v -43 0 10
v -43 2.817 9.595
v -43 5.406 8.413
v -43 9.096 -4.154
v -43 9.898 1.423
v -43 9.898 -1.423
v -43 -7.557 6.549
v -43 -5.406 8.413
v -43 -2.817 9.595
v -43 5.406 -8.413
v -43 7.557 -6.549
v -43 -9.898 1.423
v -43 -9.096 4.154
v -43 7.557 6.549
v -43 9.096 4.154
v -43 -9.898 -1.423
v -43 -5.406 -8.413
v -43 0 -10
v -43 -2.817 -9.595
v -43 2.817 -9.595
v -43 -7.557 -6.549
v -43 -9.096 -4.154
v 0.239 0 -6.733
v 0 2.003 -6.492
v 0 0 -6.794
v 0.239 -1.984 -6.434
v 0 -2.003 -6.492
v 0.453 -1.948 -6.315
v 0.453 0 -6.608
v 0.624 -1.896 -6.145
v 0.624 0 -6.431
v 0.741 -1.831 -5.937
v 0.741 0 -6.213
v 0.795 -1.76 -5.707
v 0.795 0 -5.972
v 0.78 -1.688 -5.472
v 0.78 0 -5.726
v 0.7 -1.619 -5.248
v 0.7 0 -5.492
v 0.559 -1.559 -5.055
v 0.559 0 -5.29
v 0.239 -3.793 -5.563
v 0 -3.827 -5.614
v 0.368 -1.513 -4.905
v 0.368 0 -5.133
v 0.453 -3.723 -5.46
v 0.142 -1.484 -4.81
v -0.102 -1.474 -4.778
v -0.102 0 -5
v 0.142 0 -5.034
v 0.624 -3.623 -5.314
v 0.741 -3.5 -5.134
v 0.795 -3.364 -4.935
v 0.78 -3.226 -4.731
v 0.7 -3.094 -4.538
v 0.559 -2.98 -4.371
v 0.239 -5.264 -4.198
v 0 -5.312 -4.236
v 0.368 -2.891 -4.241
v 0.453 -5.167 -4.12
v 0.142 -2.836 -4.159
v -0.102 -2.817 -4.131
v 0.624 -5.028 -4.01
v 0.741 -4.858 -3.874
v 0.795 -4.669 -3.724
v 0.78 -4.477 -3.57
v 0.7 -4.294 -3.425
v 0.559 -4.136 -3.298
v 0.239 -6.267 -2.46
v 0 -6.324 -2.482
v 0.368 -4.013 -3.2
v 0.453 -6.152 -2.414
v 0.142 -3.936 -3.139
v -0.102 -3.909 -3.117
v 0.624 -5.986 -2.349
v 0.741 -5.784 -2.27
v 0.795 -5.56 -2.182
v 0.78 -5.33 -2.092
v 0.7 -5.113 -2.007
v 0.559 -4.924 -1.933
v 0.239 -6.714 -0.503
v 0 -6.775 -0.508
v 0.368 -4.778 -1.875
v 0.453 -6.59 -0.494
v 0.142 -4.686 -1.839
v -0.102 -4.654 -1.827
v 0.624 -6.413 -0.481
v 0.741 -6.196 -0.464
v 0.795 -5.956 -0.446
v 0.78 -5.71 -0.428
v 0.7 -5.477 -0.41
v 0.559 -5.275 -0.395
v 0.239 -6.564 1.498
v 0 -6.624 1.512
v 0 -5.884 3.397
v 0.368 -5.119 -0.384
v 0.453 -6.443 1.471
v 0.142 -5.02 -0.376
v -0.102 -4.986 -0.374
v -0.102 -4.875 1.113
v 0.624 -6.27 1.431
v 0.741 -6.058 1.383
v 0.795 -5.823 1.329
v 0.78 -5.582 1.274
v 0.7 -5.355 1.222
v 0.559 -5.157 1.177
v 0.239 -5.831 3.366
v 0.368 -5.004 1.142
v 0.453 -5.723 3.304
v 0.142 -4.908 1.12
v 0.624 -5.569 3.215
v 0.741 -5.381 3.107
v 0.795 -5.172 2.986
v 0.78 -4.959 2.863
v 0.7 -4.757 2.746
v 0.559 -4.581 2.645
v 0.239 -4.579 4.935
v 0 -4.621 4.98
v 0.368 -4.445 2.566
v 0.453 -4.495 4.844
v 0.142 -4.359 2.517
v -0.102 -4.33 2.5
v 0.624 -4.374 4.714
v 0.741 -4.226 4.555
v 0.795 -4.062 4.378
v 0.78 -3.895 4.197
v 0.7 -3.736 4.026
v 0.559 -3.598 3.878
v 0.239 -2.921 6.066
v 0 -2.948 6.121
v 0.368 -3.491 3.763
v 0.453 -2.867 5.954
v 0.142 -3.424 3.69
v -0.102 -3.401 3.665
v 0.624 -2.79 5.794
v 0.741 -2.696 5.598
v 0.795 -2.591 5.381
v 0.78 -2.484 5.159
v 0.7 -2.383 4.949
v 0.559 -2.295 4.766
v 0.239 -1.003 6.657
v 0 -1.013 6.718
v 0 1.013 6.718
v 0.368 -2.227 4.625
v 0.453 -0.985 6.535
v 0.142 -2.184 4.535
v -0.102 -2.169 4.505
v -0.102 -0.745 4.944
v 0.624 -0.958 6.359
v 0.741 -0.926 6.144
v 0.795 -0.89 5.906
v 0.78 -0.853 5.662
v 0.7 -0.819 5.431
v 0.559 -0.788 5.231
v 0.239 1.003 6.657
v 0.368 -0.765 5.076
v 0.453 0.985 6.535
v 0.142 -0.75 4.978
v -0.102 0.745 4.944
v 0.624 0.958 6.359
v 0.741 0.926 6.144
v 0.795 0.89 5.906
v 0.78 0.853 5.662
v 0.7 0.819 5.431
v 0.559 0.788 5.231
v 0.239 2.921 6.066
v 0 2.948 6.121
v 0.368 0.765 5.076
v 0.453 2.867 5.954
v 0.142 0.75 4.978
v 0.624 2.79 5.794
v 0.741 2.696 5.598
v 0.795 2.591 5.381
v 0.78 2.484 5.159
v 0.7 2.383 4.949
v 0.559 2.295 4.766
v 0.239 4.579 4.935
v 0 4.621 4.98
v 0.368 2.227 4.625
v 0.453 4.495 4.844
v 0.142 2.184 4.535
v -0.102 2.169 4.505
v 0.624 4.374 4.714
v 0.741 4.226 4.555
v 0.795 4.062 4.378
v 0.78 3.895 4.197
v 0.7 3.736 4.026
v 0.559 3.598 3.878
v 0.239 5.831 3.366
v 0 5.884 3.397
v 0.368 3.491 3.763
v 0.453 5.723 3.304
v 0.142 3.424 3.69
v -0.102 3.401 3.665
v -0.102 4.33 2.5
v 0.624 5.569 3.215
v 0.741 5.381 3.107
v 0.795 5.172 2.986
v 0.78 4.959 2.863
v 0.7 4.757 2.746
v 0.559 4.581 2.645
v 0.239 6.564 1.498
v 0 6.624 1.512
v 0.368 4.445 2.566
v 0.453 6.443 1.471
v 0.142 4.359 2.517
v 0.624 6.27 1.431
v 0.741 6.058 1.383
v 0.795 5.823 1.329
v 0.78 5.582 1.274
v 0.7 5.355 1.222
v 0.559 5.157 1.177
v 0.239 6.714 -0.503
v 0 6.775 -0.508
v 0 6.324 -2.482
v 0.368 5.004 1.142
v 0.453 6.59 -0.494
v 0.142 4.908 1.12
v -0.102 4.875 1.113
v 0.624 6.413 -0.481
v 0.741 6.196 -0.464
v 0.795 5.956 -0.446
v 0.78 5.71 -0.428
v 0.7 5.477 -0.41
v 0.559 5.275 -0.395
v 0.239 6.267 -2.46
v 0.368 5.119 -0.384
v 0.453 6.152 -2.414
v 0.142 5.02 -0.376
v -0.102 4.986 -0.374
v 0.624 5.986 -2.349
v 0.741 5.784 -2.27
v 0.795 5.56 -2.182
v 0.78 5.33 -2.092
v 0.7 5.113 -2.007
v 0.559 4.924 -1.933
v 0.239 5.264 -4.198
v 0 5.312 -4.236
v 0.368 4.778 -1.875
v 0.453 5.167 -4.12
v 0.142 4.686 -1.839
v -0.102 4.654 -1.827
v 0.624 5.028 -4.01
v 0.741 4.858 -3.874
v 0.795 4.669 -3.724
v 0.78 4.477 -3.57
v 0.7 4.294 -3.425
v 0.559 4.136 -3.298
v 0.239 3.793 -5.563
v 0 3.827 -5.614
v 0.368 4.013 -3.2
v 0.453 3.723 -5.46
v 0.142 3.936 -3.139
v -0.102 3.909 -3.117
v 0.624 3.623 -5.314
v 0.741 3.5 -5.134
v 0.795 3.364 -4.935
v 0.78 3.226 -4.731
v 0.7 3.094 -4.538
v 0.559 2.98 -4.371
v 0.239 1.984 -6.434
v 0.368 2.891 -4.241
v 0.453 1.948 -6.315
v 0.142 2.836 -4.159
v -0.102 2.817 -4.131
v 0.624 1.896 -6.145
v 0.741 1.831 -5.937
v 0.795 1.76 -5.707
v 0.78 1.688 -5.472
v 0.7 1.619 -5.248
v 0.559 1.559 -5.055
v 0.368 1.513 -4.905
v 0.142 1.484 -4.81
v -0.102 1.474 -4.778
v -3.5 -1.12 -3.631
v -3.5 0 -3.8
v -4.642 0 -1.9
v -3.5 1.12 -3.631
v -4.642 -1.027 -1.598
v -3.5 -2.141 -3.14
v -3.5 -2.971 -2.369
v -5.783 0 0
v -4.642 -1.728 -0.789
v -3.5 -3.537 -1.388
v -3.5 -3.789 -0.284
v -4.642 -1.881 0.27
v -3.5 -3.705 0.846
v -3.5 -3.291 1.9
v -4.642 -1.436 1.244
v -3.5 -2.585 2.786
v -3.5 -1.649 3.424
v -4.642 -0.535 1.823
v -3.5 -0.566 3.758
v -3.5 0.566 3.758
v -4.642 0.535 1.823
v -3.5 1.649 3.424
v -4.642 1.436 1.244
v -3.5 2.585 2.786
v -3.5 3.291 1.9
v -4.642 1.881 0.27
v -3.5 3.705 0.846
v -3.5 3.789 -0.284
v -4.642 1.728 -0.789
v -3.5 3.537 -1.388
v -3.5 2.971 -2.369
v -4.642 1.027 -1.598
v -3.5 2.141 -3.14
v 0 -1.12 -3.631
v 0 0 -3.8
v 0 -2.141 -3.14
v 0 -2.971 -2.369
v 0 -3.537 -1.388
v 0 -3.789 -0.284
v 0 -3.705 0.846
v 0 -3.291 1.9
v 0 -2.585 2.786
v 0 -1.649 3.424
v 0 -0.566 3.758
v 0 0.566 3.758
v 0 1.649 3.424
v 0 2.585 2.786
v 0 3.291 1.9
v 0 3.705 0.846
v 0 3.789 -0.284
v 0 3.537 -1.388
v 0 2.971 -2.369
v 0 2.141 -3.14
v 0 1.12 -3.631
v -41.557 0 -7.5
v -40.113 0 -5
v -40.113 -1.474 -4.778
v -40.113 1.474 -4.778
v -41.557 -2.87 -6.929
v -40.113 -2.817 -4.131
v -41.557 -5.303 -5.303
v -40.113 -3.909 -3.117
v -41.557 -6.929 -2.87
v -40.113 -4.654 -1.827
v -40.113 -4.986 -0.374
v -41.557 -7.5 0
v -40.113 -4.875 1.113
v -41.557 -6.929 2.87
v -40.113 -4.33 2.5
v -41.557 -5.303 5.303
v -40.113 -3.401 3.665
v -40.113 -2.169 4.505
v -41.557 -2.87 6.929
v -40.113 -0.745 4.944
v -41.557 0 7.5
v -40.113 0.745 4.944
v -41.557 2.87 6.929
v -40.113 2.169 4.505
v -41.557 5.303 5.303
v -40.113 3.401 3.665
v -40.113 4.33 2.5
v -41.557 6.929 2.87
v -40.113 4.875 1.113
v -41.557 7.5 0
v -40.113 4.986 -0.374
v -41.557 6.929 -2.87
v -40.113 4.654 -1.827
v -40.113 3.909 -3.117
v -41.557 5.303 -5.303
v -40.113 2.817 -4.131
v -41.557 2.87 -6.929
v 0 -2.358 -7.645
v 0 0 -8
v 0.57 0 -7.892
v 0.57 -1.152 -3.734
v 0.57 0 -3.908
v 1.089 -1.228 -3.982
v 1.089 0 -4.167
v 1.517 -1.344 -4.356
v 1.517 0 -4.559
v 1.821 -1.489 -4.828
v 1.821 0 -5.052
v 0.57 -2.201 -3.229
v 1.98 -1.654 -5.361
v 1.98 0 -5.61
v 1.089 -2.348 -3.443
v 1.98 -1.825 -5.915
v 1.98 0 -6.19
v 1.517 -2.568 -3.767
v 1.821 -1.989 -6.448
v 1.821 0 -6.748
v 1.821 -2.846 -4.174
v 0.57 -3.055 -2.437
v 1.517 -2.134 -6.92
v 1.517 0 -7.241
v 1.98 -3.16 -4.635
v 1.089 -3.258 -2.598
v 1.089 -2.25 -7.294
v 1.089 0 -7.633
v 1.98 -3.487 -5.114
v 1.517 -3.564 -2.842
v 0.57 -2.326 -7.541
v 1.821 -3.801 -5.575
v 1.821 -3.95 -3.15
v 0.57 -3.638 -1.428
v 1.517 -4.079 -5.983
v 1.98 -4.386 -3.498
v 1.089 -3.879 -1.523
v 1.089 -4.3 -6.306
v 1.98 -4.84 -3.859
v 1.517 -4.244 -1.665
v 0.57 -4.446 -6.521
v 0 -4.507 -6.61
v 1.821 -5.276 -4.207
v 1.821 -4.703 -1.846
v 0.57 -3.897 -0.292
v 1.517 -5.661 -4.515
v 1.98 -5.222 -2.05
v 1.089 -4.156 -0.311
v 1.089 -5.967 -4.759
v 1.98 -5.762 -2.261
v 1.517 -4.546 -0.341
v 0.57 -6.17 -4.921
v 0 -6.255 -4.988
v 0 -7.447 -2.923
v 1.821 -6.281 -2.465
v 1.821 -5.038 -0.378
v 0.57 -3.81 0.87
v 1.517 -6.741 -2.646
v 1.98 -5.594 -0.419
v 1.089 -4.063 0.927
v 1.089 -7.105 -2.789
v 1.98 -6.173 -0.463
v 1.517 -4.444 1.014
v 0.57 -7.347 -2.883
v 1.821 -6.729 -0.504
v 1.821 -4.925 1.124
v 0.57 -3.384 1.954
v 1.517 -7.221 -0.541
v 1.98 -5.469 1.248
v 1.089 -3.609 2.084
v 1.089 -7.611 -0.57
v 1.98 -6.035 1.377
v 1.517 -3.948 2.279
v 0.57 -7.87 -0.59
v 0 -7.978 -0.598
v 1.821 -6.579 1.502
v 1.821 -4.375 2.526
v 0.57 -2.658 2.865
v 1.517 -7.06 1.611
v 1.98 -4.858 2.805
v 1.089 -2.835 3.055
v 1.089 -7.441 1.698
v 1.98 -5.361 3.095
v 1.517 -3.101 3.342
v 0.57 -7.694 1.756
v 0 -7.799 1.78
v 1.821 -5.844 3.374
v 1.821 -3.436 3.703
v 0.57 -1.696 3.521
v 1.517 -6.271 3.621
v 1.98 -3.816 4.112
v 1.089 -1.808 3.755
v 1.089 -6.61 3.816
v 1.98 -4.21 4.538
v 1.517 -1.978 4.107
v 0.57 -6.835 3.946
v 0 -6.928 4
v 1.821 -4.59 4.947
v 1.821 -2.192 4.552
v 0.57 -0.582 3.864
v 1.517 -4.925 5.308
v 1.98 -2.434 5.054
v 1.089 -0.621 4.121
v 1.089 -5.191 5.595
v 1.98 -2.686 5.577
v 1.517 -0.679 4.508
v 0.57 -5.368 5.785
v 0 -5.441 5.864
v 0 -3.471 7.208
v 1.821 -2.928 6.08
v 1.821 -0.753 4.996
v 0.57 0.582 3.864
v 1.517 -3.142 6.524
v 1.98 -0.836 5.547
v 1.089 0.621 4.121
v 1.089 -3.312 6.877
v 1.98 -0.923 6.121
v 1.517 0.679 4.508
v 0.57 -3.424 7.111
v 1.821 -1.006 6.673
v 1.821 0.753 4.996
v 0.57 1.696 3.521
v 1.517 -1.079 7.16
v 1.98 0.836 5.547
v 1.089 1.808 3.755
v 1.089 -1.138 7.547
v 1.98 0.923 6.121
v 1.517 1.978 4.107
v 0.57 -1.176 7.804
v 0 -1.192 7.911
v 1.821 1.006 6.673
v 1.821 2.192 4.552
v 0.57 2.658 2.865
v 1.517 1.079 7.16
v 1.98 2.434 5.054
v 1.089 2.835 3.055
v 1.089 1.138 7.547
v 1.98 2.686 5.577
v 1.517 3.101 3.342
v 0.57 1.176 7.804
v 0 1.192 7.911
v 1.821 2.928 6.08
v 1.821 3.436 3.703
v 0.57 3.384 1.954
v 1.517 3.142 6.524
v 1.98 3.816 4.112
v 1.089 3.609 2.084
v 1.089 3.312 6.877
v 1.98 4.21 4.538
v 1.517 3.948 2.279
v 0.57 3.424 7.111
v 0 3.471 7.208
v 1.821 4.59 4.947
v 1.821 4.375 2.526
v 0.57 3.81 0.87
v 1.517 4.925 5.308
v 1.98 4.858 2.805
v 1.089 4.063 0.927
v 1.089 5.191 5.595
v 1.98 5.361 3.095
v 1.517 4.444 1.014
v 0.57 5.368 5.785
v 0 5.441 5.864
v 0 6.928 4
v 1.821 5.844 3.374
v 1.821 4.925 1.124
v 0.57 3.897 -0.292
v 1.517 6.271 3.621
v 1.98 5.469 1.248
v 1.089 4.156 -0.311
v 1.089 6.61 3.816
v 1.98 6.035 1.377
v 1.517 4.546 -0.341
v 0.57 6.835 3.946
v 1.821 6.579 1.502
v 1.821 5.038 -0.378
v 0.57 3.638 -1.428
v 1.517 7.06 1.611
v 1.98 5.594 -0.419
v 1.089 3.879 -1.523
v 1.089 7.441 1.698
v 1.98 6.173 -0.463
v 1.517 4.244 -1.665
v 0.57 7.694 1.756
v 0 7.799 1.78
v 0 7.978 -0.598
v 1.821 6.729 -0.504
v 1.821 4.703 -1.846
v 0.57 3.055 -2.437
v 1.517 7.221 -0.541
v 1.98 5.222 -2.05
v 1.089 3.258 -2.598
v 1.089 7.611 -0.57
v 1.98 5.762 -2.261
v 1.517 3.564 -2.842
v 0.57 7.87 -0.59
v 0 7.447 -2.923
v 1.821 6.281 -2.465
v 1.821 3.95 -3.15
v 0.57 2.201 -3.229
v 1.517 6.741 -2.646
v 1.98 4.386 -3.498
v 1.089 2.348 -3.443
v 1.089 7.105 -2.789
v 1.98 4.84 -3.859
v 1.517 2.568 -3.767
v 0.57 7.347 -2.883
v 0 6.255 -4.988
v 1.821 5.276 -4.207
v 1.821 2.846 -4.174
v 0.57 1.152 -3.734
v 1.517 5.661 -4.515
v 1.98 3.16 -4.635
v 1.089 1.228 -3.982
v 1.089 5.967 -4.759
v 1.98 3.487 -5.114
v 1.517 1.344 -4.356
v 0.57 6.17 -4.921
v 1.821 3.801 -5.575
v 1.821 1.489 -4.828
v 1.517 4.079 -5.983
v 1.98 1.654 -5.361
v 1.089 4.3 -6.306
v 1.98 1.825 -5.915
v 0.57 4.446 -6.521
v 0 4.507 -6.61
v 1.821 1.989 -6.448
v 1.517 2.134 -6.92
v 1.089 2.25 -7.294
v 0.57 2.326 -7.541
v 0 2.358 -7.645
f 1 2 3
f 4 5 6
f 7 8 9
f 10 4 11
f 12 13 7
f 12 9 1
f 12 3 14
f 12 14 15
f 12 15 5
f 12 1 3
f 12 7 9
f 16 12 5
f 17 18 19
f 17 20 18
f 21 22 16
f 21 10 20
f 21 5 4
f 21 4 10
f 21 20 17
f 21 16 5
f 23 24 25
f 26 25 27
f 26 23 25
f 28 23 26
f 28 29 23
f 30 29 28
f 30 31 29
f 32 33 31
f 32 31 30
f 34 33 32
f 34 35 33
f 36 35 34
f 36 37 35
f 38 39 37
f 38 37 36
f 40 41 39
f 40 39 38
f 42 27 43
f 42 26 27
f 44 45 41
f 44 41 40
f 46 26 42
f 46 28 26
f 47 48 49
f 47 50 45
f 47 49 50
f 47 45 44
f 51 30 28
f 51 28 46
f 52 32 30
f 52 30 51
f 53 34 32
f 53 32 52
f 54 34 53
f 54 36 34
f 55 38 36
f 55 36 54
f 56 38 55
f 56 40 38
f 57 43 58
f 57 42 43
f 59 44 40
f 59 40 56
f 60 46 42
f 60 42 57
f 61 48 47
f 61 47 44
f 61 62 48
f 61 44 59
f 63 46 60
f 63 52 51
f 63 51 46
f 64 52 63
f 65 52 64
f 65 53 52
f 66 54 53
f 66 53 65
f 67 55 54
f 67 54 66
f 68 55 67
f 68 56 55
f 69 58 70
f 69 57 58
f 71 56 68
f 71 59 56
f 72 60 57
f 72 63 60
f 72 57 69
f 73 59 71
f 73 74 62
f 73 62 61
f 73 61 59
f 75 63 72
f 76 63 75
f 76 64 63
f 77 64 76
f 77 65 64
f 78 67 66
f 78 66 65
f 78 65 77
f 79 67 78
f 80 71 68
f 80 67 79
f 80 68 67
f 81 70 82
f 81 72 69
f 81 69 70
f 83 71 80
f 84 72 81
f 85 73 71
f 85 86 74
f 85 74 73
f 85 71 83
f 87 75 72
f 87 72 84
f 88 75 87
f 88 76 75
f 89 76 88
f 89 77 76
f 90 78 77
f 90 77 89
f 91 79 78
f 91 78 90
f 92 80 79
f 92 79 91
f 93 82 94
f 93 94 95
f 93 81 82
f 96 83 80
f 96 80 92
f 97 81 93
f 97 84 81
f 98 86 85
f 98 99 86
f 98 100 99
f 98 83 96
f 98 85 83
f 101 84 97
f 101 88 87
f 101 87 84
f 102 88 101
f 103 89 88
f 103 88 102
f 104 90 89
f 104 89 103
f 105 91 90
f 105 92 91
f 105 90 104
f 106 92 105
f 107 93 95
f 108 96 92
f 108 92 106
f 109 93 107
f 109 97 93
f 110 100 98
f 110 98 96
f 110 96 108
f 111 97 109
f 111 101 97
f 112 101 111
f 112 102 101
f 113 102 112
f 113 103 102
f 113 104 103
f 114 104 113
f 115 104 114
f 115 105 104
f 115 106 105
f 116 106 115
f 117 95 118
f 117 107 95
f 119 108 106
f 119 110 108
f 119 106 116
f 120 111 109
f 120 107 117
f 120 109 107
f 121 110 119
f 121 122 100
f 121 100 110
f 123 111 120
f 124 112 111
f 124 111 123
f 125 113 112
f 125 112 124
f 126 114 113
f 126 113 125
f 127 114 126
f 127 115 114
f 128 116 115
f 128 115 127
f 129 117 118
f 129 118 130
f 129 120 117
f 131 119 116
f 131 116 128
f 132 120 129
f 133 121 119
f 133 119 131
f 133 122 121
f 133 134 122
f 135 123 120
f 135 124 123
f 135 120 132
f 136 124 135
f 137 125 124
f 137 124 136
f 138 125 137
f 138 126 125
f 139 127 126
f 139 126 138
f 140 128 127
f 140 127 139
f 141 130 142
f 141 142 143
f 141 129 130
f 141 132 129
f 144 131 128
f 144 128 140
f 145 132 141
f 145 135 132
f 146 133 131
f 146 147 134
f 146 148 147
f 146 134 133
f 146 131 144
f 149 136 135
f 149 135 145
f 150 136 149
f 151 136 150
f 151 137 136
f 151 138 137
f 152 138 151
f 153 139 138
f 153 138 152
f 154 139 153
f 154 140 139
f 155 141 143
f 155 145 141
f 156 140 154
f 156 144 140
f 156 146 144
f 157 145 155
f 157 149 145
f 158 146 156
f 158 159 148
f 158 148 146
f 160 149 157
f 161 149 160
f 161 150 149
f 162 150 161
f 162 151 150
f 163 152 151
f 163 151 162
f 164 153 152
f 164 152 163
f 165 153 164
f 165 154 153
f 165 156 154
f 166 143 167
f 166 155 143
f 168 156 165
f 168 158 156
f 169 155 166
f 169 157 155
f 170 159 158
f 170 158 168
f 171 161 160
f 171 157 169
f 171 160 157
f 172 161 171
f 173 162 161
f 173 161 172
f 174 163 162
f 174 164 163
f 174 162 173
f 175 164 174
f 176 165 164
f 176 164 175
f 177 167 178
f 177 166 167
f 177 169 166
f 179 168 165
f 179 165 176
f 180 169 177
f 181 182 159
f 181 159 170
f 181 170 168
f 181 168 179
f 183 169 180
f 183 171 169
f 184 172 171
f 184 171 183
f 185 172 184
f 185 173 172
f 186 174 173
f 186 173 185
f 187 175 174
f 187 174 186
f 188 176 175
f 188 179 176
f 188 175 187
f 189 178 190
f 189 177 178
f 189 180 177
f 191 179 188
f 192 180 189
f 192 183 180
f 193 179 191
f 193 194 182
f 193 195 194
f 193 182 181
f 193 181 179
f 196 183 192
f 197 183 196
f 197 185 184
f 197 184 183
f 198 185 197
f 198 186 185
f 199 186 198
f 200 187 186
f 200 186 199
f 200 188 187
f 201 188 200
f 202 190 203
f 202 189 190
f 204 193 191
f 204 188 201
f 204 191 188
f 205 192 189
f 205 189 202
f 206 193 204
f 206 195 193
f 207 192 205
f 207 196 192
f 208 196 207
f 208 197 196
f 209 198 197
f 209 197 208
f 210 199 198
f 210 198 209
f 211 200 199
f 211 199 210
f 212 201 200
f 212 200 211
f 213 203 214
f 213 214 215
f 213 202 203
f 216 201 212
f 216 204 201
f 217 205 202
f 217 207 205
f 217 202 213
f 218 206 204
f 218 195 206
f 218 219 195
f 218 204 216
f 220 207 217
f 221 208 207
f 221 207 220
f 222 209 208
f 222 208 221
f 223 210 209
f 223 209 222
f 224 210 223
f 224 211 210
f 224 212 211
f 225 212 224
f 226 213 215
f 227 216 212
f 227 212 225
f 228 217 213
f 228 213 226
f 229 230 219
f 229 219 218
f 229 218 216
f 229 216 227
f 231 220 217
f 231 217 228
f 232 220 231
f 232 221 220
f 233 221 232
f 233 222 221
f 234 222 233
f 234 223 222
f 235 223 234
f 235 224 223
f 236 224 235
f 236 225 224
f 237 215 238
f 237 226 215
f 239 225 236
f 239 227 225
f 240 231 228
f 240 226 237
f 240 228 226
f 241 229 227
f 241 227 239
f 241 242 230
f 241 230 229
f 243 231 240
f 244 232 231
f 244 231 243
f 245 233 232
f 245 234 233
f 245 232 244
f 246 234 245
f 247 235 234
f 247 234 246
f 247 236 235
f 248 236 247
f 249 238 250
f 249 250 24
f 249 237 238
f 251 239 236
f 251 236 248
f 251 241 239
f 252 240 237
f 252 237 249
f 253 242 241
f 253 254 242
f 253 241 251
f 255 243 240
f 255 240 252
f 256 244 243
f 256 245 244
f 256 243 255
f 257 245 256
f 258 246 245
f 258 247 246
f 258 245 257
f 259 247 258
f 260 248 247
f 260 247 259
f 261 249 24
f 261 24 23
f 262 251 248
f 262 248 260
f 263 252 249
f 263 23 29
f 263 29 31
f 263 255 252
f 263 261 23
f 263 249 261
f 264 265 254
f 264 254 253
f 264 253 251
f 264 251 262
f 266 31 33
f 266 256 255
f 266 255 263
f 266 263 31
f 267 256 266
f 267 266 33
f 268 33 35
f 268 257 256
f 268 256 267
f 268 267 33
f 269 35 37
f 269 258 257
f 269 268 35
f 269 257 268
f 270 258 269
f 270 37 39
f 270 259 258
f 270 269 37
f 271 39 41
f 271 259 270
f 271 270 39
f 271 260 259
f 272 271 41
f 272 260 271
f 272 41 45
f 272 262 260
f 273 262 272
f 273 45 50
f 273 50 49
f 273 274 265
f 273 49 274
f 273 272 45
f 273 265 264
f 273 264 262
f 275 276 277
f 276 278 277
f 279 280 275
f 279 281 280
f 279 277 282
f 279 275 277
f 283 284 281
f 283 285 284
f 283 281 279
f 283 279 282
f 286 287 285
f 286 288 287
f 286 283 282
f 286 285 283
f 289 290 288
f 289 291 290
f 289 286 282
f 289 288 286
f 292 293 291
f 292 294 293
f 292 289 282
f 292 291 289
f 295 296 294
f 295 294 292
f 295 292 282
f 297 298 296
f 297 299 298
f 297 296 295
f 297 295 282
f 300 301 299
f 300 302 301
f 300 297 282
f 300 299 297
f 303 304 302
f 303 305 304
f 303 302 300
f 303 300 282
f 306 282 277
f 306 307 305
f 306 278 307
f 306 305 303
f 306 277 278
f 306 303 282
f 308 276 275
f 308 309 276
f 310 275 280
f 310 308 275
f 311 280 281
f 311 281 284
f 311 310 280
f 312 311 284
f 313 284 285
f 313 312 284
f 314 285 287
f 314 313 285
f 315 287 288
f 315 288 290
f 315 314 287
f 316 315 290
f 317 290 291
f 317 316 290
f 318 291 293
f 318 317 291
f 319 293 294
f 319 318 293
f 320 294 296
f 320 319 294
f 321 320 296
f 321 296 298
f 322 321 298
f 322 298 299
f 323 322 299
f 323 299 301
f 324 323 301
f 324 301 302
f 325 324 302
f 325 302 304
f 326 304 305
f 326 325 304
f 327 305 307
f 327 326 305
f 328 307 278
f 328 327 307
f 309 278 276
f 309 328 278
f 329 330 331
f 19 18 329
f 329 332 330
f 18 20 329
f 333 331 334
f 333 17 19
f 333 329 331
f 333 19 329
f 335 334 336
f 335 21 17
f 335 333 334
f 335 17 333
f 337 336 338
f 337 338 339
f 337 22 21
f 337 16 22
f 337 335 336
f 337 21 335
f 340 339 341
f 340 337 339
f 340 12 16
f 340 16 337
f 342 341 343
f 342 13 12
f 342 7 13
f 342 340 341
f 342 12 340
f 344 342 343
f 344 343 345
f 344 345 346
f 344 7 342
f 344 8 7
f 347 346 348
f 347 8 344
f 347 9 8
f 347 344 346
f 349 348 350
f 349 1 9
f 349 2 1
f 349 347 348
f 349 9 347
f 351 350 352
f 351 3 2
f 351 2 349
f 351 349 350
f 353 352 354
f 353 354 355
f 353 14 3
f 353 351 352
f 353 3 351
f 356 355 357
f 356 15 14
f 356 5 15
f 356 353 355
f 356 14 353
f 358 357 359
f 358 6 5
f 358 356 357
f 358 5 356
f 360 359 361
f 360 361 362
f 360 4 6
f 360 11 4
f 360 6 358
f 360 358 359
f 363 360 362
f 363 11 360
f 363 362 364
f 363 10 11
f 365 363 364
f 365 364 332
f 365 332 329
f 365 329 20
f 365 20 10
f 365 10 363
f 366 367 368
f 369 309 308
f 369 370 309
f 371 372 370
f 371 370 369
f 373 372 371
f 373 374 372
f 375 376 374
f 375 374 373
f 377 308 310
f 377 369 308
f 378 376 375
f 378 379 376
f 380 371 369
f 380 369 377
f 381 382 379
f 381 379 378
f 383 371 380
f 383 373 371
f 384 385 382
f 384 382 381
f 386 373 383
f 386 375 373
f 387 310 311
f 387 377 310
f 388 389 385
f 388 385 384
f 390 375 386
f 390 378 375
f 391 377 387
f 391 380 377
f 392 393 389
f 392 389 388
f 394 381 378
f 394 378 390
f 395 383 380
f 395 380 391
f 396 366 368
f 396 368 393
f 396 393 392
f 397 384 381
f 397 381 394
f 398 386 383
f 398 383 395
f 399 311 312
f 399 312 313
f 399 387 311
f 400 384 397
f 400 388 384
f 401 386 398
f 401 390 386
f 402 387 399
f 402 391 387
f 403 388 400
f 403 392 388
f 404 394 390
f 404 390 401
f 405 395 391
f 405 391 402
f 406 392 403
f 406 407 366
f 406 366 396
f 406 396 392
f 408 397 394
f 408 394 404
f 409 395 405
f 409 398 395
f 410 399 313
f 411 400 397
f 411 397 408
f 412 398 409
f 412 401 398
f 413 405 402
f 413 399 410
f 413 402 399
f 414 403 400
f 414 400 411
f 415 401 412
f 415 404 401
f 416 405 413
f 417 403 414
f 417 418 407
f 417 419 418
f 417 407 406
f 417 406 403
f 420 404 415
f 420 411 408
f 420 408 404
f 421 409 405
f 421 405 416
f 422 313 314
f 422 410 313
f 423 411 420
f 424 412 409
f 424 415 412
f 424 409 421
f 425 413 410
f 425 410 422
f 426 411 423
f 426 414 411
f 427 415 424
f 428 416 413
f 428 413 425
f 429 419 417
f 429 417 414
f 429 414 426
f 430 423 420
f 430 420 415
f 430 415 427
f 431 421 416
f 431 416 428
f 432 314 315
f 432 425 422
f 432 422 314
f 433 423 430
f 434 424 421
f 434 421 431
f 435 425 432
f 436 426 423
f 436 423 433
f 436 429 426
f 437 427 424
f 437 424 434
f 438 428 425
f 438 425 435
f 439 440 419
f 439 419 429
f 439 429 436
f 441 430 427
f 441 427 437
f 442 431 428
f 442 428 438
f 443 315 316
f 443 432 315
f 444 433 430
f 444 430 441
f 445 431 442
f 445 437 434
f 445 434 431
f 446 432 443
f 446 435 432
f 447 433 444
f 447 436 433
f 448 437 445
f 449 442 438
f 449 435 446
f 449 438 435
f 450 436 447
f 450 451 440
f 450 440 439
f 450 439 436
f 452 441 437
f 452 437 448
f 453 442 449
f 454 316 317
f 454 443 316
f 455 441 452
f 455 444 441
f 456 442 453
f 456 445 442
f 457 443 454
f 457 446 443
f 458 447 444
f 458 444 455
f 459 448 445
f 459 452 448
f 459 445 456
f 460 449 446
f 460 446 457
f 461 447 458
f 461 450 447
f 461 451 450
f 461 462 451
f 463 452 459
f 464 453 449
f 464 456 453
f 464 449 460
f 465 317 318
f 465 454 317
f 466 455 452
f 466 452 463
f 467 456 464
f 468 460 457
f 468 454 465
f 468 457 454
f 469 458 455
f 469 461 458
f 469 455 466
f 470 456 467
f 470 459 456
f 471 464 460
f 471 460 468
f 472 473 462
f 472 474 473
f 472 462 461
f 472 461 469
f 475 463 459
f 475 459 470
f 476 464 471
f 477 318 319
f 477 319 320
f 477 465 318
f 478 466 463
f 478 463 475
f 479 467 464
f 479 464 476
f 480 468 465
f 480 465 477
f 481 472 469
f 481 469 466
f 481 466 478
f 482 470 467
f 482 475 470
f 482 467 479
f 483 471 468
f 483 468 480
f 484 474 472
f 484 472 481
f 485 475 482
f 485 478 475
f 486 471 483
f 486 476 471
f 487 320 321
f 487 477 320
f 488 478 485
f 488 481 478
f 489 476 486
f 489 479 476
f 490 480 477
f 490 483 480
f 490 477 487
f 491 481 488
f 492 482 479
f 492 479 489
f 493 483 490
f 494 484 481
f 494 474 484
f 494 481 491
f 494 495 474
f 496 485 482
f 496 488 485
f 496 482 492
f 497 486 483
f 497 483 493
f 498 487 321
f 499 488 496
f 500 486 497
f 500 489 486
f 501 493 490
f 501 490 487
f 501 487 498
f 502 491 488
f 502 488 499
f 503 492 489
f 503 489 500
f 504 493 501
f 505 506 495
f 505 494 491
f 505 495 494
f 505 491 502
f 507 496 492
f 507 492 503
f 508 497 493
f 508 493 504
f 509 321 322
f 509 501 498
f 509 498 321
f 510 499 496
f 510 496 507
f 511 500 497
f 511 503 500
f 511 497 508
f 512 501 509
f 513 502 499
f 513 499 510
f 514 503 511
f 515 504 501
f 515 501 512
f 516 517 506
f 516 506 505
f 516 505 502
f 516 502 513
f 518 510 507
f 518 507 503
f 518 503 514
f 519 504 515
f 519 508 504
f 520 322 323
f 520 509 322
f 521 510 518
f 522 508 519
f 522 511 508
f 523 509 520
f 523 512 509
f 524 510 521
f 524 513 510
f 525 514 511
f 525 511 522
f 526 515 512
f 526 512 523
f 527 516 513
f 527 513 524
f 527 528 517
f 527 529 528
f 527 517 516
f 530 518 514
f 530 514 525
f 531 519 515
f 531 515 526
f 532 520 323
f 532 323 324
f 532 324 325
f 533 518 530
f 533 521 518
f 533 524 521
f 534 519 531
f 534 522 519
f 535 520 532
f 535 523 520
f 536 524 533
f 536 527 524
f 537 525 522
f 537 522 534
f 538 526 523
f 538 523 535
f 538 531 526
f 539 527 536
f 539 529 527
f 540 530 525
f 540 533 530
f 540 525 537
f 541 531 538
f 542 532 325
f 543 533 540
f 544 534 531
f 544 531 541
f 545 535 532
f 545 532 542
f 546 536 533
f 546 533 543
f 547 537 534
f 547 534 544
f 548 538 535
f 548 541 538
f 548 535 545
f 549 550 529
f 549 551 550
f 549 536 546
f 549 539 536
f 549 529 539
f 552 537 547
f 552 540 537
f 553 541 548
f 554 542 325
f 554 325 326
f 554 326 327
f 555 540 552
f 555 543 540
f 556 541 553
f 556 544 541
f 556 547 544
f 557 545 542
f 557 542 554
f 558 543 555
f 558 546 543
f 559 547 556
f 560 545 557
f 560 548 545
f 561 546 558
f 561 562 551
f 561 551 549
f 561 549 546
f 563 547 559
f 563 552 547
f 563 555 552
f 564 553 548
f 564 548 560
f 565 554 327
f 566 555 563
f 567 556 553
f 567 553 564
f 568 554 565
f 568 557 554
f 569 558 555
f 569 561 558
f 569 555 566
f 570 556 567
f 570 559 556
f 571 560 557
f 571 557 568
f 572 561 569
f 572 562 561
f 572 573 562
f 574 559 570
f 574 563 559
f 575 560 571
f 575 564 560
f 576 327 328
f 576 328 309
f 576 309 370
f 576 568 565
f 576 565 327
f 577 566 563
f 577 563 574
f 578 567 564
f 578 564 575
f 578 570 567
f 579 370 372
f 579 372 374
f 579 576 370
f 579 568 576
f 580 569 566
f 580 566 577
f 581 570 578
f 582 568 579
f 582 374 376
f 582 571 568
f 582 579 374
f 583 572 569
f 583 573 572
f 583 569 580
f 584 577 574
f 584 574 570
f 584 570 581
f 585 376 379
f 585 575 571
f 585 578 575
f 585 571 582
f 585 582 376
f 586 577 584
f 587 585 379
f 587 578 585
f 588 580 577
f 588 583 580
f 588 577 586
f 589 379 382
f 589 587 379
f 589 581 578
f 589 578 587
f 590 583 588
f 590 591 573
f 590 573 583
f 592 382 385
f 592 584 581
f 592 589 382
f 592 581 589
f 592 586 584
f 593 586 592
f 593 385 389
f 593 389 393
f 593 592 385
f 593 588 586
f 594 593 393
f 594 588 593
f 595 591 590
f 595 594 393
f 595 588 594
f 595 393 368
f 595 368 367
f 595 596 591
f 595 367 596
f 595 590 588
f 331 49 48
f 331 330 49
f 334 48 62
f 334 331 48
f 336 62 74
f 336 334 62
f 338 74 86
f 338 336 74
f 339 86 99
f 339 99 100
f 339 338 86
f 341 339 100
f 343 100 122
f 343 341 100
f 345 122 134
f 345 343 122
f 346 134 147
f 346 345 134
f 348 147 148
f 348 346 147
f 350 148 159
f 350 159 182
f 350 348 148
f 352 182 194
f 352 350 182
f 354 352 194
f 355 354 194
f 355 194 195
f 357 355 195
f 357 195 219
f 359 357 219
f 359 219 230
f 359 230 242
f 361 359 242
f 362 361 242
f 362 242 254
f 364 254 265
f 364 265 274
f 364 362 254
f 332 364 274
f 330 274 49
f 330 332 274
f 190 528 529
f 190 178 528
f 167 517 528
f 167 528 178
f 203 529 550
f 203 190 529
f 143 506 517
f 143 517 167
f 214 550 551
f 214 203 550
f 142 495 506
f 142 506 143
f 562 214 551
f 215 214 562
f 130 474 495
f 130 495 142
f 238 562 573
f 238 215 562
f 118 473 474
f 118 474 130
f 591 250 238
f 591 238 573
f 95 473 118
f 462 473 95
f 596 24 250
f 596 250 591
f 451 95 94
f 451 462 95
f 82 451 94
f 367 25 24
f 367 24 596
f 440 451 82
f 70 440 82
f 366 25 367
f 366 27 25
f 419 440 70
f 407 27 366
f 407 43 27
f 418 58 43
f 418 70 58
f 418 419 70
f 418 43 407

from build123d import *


with BuildPart() as part:
    # Sketch1 → Base-Revolve (revolve)
    with BuildSketch(Plane.XY, mode=Mode.PRIVATE) as base_revolve_sk:
        with BuildLine():
            Line((0, 8), (0, 6.794144144))
            ThreePointArc((0, 6.794144144), (0.796034843, 5.848666431), (-0.1025, 5))
            Line((-0.1025, 5), (-40.113248654, 5))
            Line((-40.113248654, 5), (-43, 10))
            Line((-43, 10), (-43, 0))
            Line((-43, 0), (-5.783270352, 0))
            Line((-5.783270352, 0), (-3.5, 3.8))
            Line((-3.5, 3.8), (0, 3.8))
            ThreePointArc((0, 3.8), (2, 5.9), (0, 8))
        make_face()
    revolve(base_revolve_sk.sketch.rotate(Axis((40.376928104, 0, 0), (-1, 0, 0)), 90), axis=Axis((40.376928104, 0, 0), (-1, 0, 0)))


solid = part.part
